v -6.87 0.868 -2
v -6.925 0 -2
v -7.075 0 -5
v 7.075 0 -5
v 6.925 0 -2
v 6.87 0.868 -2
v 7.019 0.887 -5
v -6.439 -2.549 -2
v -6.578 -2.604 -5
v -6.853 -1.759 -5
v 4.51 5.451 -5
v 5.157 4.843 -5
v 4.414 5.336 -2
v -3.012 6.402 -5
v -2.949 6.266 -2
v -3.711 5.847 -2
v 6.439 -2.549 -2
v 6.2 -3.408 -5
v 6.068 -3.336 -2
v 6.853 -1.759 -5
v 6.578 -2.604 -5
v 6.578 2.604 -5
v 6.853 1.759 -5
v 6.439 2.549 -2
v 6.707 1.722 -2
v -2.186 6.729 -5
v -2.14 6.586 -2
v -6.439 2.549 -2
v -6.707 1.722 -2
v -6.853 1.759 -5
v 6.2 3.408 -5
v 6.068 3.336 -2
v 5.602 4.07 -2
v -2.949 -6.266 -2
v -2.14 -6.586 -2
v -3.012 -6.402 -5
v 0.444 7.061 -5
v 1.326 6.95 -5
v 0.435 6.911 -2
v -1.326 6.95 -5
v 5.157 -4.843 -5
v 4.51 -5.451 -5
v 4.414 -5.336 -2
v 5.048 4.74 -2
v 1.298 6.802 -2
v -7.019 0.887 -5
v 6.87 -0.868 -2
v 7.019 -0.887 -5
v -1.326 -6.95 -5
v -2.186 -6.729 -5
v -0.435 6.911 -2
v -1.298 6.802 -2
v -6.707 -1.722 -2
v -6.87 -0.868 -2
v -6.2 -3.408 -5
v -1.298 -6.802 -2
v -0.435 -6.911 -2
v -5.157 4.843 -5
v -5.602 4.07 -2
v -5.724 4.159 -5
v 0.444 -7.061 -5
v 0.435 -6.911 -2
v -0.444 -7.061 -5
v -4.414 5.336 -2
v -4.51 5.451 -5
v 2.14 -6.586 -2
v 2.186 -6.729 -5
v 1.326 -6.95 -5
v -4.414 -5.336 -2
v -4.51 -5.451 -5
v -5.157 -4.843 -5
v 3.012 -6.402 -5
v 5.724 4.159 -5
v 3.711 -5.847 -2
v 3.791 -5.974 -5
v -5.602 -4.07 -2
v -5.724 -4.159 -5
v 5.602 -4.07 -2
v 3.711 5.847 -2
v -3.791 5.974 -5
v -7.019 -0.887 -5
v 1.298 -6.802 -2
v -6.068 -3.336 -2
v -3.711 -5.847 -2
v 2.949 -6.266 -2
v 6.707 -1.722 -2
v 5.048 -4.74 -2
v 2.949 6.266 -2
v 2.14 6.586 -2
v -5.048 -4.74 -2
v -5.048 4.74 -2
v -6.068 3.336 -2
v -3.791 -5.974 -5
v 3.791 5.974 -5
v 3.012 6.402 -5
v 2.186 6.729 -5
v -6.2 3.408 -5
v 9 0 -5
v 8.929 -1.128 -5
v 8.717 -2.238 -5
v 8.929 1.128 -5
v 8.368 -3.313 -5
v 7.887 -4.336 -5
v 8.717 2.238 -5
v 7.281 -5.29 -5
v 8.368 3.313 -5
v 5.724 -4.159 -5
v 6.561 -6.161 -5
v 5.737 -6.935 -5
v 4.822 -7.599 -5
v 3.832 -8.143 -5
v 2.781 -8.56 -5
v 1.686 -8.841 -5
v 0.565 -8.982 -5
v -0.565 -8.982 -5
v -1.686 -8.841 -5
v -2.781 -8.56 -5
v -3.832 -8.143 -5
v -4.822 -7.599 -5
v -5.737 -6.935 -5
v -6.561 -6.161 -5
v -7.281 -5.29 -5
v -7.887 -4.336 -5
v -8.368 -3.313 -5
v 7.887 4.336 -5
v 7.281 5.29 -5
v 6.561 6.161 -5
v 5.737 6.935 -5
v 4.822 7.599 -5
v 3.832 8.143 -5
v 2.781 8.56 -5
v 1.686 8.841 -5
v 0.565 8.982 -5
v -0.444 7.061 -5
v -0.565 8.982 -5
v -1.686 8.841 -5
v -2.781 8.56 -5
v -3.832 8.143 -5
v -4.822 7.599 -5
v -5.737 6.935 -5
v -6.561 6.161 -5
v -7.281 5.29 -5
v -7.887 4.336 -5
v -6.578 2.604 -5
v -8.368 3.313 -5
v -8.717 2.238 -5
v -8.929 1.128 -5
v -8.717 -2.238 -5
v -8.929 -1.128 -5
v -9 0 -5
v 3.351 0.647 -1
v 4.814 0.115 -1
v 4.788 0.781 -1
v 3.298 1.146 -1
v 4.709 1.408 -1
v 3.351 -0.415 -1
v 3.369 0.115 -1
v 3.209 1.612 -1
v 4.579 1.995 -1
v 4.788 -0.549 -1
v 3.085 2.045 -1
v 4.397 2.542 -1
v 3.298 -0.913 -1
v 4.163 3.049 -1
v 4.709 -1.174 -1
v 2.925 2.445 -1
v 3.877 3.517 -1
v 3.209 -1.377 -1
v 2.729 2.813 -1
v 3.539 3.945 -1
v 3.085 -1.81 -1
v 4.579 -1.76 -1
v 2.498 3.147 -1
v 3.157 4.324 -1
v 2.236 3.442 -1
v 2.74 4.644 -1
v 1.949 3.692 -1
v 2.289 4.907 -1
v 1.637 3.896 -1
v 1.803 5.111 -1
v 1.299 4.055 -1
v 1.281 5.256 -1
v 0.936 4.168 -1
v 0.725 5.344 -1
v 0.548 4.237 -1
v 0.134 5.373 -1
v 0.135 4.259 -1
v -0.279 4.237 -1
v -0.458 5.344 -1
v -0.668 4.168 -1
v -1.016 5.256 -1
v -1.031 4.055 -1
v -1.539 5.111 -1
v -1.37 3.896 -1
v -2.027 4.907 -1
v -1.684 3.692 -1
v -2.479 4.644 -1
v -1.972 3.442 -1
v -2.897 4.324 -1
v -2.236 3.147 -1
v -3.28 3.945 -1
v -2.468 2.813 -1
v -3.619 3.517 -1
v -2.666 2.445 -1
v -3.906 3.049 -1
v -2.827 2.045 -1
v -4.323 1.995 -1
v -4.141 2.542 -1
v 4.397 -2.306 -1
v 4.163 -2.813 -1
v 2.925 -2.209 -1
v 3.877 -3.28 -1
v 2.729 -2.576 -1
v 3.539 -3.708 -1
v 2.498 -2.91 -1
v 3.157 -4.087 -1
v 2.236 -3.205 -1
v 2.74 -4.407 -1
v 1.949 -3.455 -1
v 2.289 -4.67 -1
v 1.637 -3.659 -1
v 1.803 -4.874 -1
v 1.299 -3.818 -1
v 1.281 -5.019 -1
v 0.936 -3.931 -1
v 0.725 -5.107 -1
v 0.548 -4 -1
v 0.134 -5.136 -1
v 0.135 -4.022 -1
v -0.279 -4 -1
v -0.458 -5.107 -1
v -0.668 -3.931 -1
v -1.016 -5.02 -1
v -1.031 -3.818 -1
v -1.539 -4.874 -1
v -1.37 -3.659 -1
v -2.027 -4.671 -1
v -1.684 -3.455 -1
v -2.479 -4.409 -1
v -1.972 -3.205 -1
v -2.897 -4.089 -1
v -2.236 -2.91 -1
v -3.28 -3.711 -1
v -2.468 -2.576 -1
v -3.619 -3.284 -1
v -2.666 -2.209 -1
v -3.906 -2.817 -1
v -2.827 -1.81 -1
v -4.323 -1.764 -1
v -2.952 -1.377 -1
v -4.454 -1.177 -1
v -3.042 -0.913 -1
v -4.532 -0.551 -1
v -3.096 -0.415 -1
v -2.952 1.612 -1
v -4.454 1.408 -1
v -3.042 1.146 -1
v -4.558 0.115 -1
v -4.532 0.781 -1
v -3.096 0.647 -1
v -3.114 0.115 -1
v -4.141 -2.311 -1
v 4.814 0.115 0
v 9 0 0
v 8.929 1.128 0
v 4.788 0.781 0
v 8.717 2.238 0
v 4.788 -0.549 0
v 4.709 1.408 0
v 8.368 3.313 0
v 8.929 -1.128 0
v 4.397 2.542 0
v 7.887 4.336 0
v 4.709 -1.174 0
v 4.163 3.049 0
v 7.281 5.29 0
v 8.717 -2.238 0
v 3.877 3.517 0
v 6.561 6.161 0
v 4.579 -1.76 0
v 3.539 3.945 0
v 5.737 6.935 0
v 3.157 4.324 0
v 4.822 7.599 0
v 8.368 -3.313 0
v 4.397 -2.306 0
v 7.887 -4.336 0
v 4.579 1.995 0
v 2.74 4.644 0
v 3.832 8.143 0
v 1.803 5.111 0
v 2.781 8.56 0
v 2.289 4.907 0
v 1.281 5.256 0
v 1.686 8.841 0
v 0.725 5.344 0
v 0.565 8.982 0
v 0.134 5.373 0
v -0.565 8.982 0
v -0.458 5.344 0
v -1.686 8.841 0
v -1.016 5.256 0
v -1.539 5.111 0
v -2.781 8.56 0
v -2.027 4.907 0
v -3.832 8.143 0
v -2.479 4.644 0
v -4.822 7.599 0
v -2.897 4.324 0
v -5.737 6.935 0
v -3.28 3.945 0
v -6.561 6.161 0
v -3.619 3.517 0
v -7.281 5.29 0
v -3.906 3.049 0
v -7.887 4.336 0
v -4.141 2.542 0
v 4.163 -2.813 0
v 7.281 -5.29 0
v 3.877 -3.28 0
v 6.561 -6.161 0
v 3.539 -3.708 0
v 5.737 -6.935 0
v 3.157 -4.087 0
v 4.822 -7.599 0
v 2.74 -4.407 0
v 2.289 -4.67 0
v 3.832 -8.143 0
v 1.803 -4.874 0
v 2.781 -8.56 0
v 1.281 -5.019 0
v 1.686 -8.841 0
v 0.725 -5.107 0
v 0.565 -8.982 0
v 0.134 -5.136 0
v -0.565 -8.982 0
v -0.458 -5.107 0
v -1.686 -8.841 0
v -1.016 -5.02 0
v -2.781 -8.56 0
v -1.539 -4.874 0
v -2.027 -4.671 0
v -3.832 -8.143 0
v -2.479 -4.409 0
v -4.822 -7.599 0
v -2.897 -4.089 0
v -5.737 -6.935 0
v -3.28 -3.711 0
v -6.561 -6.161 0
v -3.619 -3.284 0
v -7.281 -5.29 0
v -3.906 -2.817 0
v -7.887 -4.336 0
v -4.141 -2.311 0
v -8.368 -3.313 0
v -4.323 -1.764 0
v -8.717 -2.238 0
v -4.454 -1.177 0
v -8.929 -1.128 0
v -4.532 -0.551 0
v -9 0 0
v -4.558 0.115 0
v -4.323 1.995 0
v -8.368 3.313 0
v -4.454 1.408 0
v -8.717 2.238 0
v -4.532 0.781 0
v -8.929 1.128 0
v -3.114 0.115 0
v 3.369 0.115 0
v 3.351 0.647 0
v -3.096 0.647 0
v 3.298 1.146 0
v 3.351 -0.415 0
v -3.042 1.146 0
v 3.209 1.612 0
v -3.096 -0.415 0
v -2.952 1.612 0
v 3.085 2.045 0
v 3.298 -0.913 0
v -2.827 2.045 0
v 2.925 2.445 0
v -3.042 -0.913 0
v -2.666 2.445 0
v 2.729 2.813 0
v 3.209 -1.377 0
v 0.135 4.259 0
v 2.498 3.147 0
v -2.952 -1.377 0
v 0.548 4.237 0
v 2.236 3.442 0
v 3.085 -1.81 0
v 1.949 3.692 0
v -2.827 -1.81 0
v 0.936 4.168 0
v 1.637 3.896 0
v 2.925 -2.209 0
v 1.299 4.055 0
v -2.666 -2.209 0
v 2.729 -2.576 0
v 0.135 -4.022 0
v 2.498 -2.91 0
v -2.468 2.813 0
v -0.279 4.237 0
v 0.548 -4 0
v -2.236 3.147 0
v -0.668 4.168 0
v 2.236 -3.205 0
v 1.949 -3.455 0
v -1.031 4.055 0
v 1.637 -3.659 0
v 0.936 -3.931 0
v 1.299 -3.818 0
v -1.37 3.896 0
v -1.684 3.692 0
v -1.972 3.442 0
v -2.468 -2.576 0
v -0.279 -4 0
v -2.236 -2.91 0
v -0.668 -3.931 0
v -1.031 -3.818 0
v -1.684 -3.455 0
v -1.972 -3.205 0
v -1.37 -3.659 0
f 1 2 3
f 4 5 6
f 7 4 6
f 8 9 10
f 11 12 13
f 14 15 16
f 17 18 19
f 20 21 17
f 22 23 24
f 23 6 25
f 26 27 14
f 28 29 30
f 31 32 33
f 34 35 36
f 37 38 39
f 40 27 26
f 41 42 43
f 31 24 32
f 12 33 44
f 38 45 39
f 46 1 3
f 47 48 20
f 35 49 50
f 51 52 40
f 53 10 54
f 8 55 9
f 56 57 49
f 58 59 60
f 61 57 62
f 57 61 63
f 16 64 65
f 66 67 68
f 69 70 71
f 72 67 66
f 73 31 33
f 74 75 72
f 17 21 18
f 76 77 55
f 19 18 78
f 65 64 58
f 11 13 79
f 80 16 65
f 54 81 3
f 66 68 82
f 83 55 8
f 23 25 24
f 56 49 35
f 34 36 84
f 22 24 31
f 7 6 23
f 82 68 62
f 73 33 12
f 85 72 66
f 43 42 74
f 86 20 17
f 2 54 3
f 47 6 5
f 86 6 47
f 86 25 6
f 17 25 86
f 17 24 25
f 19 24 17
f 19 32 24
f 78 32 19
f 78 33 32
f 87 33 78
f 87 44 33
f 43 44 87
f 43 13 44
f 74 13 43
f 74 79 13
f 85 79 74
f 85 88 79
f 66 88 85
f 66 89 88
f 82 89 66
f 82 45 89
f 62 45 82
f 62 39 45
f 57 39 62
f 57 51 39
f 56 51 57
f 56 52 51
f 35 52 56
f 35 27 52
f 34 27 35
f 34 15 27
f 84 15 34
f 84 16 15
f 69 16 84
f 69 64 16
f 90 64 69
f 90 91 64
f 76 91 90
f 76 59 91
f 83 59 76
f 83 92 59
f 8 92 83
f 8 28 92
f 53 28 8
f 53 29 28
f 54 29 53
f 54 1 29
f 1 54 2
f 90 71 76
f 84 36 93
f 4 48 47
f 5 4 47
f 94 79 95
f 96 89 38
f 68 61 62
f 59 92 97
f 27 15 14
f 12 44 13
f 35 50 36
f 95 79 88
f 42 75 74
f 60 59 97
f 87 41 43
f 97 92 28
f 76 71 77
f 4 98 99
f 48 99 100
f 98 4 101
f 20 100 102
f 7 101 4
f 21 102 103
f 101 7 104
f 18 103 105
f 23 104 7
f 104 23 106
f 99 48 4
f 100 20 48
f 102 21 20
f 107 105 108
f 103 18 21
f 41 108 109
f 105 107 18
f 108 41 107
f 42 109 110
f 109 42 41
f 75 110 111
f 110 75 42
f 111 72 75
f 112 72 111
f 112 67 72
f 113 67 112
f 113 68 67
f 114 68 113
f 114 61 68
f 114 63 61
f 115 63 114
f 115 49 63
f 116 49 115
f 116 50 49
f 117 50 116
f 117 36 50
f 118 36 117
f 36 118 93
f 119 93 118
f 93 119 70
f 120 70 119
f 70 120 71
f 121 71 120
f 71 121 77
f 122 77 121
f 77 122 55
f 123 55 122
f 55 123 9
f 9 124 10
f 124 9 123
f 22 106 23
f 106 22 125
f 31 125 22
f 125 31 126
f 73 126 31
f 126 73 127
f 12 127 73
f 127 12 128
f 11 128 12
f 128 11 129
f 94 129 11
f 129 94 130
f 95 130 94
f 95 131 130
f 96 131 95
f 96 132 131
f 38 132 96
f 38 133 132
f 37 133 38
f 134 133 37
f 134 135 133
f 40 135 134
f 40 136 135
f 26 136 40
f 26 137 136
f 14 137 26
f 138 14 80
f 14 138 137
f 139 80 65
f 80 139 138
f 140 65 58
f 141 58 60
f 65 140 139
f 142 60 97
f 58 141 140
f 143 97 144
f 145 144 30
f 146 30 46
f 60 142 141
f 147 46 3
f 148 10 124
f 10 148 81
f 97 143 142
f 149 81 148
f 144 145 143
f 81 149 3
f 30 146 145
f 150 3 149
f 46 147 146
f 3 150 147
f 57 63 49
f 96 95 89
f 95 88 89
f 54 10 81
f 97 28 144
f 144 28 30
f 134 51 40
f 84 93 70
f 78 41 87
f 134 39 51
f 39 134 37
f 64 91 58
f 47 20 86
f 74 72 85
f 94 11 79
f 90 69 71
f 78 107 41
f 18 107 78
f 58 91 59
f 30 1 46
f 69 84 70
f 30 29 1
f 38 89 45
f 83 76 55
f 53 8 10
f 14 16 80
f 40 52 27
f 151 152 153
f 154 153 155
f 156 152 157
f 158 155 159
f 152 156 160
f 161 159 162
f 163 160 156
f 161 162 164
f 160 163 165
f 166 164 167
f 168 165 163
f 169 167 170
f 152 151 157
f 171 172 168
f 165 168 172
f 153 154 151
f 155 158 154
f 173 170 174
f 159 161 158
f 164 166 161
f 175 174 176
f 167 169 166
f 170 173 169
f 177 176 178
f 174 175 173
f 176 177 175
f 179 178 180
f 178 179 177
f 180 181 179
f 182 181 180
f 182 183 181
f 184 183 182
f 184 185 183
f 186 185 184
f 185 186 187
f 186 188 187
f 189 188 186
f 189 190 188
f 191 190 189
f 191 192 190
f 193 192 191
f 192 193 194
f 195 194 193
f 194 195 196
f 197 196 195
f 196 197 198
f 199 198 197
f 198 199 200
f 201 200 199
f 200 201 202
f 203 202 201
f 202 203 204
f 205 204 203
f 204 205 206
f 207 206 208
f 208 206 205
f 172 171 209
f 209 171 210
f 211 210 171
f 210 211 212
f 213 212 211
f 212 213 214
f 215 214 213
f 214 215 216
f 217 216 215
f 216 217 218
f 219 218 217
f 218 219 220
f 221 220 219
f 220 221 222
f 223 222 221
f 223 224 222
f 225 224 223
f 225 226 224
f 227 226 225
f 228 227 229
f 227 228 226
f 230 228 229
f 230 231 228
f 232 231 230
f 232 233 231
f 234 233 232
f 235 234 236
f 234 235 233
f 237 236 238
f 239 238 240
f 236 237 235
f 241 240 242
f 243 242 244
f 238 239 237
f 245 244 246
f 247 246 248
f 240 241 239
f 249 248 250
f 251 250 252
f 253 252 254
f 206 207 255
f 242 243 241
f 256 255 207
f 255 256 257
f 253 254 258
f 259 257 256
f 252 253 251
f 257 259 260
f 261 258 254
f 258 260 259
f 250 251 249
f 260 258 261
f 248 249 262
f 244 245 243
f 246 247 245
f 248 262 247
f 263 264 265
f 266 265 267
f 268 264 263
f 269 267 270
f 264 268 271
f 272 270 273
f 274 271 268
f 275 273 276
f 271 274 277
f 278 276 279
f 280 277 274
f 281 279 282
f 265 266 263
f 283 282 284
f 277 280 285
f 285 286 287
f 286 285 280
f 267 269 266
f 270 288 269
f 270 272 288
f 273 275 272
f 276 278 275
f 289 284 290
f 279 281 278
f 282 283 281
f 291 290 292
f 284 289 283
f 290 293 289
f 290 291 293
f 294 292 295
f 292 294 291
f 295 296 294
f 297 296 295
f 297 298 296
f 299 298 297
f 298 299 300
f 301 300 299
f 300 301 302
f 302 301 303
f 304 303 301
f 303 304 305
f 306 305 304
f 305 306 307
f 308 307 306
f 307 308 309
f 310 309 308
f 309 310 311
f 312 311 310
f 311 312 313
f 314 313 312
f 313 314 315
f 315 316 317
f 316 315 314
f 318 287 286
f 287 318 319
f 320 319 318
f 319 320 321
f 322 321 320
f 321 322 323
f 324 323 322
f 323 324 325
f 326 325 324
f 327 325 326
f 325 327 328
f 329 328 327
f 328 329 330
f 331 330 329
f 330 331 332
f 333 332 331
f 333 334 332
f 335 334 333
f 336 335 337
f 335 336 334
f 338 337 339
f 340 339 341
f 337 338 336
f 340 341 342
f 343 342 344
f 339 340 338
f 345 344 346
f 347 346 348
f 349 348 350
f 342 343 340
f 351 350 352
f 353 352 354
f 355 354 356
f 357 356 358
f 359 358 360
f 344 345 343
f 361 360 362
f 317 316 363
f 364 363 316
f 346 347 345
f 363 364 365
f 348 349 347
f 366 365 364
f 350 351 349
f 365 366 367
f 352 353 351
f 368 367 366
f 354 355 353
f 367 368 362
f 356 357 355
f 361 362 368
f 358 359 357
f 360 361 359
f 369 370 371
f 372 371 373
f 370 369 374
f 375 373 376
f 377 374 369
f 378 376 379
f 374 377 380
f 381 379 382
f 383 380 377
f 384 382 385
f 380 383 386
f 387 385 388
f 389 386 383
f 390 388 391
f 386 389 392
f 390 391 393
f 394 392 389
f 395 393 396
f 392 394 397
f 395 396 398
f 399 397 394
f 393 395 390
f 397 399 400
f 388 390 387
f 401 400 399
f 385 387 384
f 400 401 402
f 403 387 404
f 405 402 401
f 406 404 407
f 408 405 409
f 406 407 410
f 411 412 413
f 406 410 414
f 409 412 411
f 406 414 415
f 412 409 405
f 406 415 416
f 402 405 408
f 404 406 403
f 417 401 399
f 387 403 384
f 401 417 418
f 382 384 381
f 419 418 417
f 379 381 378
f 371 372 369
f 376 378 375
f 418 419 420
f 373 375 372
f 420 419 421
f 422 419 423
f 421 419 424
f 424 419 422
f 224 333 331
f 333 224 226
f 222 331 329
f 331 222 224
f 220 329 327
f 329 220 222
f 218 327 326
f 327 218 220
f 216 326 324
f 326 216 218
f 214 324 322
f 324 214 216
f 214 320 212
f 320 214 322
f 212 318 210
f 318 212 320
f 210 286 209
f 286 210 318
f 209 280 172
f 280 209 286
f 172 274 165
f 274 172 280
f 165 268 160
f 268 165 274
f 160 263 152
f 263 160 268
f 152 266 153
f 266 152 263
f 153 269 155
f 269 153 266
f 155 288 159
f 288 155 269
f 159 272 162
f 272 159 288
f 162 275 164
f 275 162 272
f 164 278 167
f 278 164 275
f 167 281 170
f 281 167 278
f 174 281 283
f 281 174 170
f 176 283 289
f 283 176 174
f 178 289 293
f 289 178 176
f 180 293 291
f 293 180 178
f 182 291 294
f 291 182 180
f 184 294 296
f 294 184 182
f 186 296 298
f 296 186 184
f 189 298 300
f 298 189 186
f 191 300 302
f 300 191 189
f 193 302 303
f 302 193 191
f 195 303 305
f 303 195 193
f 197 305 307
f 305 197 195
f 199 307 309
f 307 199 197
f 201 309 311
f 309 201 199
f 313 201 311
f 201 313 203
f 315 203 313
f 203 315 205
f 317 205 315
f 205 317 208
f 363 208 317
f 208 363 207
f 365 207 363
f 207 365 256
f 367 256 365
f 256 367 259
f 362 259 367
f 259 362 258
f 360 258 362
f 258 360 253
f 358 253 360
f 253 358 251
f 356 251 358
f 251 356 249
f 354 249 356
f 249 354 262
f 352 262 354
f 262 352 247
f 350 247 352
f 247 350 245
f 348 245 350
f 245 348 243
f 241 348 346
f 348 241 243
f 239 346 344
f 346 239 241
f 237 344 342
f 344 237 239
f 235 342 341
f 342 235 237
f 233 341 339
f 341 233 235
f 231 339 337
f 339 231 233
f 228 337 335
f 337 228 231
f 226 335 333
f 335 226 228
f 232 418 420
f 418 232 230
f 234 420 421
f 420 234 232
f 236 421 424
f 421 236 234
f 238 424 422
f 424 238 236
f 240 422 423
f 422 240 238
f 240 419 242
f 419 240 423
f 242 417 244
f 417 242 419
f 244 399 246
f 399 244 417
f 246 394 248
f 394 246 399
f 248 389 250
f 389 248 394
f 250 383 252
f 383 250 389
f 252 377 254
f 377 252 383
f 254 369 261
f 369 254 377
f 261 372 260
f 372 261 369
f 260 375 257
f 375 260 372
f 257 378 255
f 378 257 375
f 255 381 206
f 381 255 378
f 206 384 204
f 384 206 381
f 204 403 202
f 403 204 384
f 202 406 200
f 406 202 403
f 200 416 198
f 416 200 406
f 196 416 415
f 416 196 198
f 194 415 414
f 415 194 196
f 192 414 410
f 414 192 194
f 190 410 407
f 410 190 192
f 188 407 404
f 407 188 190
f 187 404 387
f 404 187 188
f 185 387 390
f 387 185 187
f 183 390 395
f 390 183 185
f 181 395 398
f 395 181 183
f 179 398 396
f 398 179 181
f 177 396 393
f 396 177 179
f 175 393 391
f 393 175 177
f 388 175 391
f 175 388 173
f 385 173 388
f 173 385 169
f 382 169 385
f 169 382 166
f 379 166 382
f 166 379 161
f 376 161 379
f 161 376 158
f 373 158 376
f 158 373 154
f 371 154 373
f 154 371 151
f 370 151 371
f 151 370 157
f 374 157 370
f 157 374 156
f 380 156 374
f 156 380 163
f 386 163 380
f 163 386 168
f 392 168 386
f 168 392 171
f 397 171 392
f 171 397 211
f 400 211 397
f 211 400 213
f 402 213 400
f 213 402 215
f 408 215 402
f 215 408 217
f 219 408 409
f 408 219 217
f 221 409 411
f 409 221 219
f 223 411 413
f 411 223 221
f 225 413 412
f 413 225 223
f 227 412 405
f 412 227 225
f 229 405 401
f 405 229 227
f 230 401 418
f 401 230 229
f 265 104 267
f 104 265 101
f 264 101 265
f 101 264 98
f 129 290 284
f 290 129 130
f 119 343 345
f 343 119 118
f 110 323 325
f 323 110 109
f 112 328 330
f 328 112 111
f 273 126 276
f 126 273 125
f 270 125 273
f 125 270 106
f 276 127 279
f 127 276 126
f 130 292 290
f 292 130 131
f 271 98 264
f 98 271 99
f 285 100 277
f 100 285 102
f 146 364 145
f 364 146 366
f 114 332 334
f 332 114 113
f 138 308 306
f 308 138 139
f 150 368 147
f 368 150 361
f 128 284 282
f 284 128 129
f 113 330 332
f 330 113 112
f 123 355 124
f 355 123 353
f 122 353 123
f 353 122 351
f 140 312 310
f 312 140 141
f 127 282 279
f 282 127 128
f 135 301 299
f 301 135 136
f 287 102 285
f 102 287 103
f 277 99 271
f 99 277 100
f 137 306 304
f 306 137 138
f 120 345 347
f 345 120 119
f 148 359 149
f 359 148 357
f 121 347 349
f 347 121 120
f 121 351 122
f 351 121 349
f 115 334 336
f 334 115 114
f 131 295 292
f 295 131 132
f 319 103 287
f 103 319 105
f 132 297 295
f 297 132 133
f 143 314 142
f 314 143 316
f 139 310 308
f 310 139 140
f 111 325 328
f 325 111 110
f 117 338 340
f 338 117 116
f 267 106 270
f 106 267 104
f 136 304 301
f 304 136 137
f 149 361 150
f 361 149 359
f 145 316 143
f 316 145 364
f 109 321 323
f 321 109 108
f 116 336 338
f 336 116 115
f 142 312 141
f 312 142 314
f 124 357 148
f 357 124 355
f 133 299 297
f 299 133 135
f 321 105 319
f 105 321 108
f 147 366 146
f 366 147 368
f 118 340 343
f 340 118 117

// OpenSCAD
$fn = 50;


difference() {
	union() {
		translate(v = [0, 0, -5.0000000000]) {
			cylinder(h = 5, r = 9.0000000000);
		}
	}
	union() {
		#translate(v = [0, 0, -5.0000000000]) {
			cylinder(h = 3, r1 = 7.0750000000, r2 = 6.9250000000);
		}
		translate(v = [0, 0, -1]) {
			linear_extrude(height = 1) {
				text(font = "Impact", halign = "center", size = 10, text = "O", valign = "center");
			}
		}
	}
}
